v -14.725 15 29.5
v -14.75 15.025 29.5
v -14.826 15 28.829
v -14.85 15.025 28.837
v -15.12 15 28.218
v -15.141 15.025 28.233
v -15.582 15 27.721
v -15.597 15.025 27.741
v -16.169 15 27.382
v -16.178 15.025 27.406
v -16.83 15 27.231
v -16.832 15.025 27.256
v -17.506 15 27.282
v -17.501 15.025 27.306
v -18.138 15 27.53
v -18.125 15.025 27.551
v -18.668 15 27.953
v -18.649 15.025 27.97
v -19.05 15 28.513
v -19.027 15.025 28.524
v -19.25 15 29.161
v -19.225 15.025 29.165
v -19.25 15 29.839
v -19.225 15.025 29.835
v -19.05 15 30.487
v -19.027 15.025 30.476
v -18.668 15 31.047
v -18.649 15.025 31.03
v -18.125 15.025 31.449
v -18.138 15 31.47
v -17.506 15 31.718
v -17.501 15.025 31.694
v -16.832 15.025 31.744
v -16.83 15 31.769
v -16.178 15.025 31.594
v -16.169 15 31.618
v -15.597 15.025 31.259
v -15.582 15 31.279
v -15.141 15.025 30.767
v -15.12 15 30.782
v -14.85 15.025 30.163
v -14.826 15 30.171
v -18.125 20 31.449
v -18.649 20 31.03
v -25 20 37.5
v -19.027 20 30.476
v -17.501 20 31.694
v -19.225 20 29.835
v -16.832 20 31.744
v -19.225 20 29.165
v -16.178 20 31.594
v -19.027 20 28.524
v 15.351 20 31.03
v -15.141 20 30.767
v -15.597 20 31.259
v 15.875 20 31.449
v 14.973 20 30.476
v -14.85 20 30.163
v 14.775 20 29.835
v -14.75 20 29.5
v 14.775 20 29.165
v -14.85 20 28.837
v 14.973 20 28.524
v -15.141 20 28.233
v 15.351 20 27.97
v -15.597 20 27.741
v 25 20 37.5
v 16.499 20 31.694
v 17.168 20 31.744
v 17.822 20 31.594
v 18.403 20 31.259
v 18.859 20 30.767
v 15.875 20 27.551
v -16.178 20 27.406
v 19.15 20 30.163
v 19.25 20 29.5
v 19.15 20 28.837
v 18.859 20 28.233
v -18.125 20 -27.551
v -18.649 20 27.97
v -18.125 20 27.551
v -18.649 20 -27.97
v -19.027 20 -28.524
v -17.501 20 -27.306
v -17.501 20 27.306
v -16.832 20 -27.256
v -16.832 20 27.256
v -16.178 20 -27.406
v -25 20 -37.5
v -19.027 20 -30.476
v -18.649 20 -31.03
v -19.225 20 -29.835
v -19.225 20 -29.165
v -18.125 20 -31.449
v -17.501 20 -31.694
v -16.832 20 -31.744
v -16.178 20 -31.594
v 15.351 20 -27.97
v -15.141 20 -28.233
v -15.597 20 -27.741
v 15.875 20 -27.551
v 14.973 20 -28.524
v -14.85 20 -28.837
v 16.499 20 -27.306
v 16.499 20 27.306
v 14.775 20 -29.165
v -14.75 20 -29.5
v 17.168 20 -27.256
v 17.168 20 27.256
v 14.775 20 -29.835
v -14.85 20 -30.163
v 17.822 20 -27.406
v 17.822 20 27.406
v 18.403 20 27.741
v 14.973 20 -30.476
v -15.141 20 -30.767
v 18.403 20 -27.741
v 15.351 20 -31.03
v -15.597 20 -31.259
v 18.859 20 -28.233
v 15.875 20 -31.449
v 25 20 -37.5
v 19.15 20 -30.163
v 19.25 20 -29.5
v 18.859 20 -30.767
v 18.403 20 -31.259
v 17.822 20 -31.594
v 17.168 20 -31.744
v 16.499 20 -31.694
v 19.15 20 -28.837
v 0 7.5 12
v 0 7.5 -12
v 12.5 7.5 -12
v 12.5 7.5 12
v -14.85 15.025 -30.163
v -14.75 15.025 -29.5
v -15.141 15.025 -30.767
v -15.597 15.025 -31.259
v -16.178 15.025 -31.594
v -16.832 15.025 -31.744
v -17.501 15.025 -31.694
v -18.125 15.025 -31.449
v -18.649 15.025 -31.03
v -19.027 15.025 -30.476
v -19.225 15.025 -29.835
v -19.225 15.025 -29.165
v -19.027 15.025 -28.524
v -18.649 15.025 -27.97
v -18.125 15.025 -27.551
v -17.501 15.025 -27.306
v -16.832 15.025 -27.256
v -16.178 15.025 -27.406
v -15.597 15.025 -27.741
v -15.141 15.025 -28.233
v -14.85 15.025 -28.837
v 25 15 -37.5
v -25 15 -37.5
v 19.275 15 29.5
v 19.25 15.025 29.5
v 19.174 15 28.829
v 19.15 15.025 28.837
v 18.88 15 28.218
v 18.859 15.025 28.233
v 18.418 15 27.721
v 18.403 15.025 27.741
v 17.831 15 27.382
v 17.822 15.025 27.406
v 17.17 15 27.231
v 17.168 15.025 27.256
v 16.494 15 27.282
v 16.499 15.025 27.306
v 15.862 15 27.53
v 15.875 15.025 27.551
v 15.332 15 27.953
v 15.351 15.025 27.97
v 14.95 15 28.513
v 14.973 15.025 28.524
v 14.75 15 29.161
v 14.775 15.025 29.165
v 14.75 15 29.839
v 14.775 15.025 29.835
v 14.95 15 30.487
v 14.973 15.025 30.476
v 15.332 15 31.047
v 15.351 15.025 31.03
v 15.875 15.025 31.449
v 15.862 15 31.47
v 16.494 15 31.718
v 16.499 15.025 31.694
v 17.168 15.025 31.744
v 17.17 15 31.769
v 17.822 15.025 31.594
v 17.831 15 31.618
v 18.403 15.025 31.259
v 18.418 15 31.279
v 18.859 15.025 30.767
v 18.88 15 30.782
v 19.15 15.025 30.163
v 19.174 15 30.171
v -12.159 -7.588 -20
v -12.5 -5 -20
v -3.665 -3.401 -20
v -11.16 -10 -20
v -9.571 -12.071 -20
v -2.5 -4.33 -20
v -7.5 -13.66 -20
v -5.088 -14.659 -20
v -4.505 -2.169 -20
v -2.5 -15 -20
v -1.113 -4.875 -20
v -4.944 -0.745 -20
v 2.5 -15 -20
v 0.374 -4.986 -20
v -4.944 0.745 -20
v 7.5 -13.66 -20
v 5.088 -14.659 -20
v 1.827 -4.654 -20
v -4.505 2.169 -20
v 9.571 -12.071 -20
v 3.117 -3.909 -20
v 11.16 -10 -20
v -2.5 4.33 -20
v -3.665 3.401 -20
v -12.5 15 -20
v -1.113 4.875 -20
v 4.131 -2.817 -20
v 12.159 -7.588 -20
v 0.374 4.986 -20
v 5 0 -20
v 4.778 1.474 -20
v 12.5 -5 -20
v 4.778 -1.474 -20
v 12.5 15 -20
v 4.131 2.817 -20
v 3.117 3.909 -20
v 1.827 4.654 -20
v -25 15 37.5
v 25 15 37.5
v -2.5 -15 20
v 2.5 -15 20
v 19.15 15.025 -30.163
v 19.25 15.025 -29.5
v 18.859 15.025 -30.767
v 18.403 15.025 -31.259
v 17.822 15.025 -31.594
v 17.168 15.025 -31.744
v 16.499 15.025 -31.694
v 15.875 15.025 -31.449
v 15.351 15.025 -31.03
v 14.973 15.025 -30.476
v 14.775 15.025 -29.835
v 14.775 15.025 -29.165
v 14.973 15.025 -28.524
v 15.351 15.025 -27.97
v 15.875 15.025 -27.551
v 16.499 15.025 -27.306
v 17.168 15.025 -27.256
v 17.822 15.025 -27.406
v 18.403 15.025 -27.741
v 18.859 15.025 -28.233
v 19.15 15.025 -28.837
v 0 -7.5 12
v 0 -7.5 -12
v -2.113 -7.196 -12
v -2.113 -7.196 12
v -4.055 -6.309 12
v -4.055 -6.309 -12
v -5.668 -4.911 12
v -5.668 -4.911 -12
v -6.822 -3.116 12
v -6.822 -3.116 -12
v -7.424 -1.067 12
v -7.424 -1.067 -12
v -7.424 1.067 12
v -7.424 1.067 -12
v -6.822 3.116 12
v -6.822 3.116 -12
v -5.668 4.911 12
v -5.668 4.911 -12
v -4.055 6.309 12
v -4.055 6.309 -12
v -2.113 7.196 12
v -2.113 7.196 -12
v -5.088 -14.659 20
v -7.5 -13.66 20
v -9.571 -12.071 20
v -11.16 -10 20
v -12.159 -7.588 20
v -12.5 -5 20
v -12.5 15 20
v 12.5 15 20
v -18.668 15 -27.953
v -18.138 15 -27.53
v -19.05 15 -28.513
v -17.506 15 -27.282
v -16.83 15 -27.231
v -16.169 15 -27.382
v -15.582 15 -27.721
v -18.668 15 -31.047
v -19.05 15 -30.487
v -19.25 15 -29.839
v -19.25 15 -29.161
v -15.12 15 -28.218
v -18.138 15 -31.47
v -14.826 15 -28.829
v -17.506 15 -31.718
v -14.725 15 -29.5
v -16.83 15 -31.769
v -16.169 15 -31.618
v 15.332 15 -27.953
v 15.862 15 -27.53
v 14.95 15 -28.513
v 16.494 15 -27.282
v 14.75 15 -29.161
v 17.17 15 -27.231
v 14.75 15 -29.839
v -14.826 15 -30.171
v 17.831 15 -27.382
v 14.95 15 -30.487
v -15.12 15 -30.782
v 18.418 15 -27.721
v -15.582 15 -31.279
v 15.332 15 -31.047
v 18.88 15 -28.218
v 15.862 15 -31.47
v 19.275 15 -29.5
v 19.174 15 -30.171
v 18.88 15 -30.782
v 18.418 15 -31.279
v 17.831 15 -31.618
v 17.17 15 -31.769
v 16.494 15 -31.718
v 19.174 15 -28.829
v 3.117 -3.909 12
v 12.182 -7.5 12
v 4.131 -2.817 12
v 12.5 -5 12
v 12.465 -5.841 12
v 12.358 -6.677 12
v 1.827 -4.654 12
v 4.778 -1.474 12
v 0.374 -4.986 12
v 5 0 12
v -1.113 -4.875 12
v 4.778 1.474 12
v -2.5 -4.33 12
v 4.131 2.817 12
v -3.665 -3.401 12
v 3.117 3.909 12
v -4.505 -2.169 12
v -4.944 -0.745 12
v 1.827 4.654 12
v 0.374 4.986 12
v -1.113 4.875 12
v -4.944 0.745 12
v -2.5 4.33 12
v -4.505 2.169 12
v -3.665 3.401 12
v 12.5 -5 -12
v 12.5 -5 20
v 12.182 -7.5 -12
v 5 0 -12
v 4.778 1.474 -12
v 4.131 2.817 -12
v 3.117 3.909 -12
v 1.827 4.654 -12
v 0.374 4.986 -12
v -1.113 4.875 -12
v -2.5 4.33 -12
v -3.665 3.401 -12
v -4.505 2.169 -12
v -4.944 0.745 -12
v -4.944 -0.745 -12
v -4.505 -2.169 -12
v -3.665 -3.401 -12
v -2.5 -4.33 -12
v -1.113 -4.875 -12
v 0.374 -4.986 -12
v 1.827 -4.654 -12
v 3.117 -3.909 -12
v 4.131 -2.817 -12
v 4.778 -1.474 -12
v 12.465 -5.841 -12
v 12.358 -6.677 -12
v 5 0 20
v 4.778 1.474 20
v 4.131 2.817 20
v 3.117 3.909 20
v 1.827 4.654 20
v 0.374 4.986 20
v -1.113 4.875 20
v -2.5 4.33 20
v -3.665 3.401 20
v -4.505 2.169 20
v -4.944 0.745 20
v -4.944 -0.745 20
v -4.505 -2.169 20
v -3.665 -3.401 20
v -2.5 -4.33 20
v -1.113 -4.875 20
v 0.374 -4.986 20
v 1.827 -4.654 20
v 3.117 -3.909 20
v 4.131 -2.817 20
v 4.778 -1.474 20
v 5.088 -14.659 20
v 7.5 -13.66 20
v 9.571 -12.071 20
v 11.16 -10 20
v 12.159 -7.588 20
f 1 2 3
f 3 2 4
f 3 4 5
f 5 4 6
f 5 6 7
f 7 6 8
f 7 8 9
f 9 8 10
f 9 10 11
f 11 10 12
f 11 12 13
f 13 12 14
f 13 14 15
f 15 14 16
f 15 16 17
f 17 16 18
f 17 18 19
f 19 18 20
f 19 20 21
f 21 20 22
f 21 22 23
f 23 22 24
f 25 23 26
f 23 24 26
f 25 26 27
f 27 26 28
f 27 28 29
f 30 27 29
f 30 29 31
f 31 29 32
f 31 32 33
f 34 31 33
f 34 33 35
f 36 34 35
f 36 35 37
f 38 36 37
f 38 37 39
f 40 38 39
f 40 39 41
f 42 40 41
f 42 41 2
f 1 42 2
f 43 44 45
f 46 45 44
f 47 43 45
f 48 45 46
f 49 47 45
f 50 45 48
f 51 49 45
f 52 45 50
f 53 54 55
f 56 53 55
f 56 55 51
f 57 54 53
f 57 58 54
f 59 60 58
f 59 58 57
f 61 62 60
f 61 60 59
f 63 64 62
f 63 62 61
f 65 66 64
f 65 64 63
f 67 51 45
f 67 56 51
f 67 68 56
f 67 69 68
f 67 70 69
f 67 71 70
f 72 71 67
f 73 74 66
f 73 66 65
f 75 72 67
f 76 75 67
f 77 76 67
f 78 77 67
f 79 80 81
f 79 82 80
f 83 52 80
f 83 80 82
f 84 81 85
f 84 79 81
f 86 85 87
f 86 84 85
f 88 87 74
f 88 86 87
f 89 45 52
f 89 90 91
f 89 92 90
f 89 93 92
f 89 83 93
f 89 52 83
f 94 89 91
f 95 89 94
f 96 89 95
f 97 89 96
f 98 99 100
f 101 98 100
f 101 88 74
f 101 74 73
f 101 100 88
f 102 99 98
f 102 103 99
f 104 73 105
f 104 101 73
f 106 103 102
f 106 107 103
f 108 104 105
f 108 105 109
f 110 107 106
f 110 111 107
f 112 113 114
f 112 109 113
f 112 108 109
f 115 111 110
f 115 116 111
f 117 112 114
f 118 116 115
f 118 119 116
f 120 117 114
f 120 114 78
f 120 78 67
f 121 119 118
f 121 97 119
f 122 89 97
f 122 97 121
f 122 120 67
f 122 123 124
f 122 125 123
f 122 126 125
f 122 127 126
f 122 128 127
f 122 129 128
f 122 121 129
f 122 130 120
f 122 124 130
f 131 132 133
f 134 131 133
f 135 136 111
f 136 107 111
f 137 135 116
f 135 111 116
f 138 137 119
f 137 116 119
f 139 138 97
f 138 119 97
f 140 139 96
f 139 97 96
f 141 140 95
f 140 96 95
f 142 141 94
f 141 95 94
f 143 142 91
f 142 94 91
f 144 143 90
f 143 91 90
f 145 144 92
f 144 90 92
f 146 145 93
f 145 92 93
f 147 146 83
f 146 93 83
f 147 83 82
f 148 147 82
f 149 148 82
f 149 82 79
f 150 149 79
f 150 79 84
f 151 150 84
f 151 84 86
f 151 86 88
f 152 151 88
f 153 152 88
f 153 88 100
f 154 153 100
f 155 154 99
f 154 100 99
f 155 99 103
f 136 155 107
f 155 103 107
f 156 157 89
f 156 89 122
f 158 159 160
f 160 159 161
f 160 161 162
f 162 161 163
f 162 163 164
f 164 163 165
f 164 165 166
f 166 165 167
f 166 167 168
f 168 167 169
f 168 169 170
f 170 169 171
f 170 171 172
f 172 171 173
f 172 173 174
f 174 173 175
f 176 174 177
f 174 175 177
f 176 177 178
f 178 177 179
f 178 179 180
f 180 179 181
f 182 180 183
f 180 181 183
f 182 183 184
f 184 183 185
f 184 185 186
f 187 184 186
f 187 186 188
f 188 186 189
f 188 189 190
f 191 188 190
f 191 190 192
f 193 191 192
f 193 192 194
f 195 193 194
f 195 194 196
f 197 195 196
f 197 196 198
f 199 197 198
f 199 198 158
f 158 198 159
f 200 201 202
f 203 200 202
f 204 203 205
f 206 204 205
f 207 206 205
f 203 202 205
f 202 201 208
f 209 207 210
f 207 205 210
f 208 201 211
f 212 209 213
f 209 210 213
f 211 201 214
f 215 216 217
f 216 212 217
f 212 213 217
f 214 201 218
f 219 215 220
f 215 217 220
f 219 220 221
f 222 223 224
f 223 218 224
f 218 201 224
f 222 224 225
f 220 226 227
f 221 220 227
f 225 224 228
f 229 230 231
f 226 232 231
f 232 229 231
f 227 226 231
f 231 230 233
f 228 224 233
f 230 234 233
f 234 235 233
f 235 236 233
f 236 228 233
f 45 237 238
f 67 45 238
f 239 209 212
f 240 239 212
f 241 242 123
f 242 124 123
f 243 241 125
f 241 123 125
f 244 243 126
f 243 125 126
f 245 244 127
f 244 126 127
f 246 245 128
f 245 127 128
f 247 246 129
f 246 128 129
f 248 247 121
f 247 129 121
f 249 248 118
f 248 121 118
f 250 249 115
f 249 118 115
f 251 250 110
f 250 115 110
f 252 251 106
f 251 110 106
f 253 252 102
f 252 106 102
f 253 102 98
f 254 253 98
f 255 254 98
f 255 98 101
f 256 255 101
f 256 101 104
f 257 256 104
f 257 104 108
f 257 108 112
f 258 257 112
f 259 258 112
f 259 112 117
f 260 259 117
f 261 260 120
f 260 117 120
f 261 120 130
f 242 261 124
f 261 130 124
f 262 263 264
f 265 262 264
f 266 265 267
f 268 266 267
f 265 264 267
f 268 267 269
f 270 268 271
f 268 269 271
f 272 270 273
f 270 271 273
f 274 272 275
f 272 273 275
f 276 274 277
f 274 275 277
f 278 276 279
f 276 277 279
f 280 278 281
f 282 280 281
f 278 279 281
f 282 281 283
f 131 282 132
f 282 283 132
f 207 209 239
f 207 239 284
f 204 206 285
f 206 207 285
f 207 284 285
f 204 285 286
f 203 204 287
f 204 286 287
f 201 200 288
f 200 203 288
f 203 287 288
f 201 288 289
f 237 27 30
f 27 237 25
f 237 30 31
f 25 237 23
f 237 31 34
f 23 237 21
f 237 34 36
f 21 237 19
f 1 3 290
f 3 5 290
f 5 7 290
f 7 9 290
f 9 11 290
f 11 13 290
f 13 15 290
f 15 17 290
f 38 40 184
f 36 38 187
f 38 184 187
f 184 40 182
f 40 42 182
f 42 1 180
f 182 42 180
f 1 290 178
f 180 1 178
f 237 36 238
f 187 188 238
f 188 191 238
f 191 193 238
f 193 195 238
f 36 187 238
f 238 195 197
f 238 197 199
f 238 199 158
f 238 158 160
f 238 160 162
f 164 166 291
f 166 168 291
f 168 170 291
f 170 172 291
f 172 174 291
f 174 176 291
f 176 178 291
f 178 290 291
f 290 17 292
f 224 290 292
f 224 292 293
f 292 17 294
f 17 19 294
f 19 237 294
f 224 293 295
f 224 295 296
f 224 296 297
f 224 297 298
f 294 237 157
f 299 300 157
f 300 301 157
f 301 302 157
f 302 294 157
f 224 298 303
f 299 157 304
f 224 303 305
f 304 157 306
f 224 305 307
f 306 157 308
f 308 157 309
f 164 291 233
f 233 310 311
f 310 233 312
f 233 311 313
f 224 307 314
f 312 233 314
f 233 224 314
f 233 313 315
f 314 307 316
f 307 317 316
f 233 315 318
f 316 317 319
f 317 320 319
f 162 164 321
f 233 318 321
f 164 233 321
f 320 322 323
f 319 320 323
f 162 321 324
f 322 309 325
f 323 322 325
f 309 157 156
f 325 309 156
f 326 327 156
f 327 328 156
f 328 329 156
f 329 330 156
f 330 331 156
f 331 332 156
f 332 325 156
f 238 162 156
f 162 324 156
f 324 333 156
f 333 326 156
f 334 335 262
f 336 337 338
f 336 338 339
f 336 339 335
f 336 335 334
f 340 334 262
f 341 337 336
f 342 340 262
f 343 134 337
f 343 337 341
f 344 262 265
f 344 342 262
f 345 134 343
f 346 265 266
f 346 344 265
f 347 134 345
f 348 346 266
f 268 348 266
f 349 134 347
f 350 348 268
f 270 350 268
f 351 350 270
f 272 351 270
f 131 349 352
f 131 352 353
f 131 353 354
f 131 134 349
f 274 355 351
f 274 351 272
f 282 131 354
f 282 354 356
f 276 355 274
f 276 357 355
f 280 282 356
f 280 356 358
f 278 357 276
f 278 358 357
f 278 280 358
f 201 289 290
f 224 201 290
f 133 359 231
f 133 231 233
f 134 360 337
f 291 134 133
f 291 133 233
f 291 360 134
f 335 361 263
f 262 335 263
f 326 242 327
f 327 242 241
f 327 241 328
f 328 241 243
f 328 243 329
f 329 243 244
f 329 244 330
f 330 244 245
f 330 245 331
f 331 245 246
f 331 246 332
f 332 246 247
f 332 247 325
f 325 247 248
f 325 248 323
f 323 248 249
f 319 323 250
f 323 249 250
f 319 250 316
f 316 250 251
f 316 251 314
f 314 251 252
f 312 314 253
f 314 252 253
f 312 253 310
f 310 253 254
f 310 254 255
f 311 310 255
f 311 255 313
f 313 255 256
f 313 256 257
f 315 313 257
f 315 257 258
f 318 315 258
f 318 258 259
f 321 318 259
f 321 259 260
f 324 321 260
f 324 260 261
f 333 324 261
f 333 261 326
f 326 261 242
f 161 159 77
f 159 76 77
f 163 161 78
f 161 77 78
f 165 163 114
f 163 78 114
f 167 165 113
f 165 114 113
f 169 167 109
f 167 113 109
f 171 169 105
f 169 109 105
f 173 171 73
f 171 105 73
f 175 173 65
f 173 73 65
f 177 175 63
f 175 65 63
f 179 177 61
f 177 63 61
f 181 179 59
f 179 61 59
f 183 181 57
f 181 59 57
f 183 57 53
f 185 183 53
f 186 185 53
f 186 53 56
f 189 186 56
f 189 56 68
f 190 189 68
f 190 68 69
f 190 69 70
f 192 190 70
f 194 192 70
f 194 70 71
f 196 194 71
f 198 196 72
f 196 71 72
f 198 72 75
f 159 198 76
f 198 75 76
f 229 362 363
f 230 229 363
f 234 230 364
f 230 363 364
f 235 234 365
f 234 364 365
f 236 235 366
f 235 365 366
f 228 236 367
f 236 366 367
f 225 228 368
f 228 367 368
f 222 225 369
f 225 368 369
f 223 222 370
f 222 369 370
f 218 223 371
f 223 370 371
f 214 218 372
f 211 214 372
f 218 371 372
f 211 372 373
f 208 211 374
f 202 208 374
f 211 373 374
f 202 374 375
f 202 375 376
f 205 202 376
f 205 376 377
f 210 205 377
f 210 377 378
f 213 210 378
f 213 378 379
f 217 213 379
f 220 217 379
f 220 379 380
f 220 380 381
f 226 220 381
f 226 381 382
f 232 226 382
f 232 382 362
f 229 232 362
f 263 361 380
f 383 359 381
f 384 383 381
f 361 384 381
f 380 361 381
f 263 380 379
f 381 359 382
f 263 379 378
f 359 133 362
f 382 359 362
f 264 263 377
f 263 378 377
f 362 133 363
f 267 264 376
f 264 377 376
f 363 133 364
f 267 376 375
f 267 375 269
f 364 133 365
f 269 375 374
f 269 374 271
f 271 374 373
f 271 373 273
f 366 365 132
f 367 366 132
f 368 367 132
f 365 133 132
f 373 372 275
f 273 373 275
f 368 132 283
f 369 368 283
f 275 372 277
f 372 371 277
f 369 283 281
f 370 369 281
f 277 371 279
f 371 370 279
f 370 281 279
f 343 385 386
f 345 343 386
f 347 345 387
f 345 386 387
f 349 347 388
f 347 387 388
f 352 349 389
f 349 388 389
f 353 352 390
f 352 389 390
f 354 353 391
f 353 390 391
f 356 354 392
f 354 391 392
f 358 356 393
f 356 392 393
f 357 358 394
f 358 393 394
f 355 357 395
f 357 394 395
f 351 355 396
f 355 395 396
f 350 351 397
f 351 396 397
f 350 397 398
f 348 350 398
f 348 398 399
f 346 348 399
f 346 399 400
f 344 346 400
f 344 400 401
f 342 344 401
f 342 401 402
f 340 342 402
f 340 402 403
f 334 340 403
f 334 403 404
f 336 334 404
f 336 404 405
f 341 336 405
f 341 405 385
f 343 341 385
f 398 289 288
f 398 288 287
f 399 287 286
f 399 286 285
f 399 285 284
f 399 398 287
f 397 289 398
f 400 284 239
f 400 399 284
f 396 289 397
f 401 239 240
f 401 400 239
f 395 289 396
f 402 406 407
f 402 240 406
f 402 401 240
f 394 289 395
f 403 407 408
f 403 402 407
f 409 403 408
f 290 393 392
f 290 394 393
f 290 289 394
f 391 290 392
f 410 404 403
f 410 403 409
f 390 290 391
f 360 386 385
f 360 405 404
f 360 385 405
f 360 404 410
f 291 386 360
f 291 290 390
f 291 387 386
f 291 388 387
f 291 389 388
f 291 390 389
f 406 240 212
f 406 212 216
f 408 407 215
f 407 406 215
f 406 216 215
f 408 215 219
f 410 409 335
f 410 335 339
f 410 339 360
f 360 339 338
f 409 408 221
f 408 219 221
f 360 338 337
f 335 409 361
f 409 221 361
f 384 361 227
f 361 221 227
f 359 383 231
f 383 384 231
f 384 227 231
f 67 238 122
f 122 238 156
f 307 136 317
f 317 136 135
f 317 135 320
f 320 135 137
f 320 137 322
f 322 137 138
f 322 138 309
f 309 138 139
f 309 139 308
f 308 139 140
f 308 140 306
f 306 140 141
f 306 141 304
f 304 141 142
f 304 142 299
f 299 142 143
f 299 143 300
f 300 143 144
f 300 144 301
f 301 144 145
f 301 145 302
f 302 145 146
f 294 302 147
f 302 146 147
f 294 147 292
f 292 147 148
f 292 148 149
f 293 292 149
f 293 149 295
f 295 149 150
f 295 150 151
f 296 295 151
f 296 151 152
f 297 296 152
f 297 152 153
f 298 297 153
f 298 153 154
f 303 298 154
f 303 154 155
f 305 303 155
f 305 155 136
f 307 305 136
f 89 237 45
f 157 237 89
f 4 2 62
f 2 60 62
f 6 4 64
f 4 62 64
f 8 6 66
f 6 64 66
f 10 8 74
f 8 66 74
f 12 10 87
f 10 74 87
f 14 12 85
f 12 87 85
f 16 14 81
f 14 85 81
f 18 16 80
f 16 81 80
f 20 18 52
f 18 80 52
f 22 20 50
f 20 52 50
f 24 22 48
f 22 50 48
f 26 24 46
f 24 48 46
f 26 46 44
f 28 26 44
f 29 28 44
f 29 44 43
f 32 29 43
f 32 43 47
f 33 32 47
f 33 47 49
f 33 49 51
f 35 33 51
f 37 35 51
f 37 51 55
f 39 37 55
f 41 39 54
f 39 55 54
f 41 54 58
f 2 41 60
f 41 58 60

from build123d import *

# Parameters (mm, degrees)
SKETCH1_W                      = 25
SKETCH1_H                      = 30
BOSS_EXTRUDE1_DEPTH            = 20
CUT_EXTRUDE1_DEPTH             = 12
CUT_EXTRUDE1_DEPTH_BACK        = 12
SKETCH3_R                      = 5
CUT_EXTRUDE2_DEPTH             = 45.511234537
SKETCH4_W                      = 50
SKETCH4_H                      = 75
BOSS_EXTRUDE2_DEPTH            = 5
FILLET1_R                      = 10
M4_CLEARANCE_HOLE1_D           = 4.5
M4_CLEARANCE_HOLE1_CSINK_D     = 4.55
M4_CLEARANCE_HOLE1_CSINK_ANGLE = 90


with BuildPart() as part:
    # Sketch1 → Boss-Extrude1 (new, symmetric)
    with BuildSketch(Plane.XY):
        Rectangle(SKETCH1_W, SKETCH1_H)
    extrude(amount=BOSS_EXTRUDE1_DEPTH, both=True)

    # Sketch2 → Cut-Extrude1 (cut, two sides: drawn at the far end of the back side and taken through both)
    with BuildSketch(Plane.XY.offset(-CUT_EXTRUDE1_DEPTH_BACK)):
        with BuildLine():
            Line((0, 7.5), (21.39891064, 7.5))
            Line((21.39891064, 7.5), (21.39891064, -7.5))
            Line((21.39891064, -7.5), (0, -7.5))
            ThreePointArc((0, -7.5), (-7.5, 0), (0, 7.5))
        make_face()
    extrude(amount=CUT_EXTRUDE1_DEPTH + CUT_EXTRUDE1_DEPTH_BACK, mode=Mode.SUBTRACT)

    # Sketch3 → Cut-Extrude2 (cut, through all)
    with BuildSketch(Plane.XY.offset(20)):
        Circle(SKETCH3_R)
    extrude(amount=-CUT_EXTRUDE2_DEPTH, mode=Mode.SUBTRACT)

    # Sketch4 → Boss-Extrude2 (add)
    with BuildSketch(Plane(origin=(0, 15, 0), x_dir=(1, 0, 0), z_dir=(0, 1, 0))):
        Rectangle(SKETCH4_W, SKETCH4_H)
    extrude(amount=BOSS_EXTRUDE2_DEPTH)

    # Fillet1
    # the kernel refuses this fillet: 10 mm, written as the material it takes off along each edge
    with BuildSketch(Plane(origin=(-12.5, -15, 45), x_dir=(0, 1, 0), z_dir=(0, 0, -1)), Plane(origin=(12.5, -15, -45), x_dir=(0, 1, 0), z_dir=(0, 0, 1))) as fillet1_piece_1:
        with BuildLine():
            CenterArc((FILLET1_R, FILLET1_R), FILLET1_R, 180, 90)
            Line((0, FILLET1_R), (0, 0))
            Line((0, 0), (FILLET1_R, 0))
        make_face()
    extrude(amount=90, mode=Mode.SUBTRACT)

    # M4 Clearance Hole1 (through all)
    with Locations(Plane(origin=(0, 15, 0), x_dir=(-1, 0, 0), z_dir=(0, -1, 0))):
        with Locations((-17, 29.5), (17, 29.5), (17, -29.5), (-17, -29.5)):
            CounterSinkHole(M4_CLEARANCE_HOLE1_D / 2, M4_CLEARANCE_HOLE1_CSINK_D / 2, counter_sink_angle=M4_CLEARANCE_HOLE1_CSINK_ANGLE)


solid = part.part
